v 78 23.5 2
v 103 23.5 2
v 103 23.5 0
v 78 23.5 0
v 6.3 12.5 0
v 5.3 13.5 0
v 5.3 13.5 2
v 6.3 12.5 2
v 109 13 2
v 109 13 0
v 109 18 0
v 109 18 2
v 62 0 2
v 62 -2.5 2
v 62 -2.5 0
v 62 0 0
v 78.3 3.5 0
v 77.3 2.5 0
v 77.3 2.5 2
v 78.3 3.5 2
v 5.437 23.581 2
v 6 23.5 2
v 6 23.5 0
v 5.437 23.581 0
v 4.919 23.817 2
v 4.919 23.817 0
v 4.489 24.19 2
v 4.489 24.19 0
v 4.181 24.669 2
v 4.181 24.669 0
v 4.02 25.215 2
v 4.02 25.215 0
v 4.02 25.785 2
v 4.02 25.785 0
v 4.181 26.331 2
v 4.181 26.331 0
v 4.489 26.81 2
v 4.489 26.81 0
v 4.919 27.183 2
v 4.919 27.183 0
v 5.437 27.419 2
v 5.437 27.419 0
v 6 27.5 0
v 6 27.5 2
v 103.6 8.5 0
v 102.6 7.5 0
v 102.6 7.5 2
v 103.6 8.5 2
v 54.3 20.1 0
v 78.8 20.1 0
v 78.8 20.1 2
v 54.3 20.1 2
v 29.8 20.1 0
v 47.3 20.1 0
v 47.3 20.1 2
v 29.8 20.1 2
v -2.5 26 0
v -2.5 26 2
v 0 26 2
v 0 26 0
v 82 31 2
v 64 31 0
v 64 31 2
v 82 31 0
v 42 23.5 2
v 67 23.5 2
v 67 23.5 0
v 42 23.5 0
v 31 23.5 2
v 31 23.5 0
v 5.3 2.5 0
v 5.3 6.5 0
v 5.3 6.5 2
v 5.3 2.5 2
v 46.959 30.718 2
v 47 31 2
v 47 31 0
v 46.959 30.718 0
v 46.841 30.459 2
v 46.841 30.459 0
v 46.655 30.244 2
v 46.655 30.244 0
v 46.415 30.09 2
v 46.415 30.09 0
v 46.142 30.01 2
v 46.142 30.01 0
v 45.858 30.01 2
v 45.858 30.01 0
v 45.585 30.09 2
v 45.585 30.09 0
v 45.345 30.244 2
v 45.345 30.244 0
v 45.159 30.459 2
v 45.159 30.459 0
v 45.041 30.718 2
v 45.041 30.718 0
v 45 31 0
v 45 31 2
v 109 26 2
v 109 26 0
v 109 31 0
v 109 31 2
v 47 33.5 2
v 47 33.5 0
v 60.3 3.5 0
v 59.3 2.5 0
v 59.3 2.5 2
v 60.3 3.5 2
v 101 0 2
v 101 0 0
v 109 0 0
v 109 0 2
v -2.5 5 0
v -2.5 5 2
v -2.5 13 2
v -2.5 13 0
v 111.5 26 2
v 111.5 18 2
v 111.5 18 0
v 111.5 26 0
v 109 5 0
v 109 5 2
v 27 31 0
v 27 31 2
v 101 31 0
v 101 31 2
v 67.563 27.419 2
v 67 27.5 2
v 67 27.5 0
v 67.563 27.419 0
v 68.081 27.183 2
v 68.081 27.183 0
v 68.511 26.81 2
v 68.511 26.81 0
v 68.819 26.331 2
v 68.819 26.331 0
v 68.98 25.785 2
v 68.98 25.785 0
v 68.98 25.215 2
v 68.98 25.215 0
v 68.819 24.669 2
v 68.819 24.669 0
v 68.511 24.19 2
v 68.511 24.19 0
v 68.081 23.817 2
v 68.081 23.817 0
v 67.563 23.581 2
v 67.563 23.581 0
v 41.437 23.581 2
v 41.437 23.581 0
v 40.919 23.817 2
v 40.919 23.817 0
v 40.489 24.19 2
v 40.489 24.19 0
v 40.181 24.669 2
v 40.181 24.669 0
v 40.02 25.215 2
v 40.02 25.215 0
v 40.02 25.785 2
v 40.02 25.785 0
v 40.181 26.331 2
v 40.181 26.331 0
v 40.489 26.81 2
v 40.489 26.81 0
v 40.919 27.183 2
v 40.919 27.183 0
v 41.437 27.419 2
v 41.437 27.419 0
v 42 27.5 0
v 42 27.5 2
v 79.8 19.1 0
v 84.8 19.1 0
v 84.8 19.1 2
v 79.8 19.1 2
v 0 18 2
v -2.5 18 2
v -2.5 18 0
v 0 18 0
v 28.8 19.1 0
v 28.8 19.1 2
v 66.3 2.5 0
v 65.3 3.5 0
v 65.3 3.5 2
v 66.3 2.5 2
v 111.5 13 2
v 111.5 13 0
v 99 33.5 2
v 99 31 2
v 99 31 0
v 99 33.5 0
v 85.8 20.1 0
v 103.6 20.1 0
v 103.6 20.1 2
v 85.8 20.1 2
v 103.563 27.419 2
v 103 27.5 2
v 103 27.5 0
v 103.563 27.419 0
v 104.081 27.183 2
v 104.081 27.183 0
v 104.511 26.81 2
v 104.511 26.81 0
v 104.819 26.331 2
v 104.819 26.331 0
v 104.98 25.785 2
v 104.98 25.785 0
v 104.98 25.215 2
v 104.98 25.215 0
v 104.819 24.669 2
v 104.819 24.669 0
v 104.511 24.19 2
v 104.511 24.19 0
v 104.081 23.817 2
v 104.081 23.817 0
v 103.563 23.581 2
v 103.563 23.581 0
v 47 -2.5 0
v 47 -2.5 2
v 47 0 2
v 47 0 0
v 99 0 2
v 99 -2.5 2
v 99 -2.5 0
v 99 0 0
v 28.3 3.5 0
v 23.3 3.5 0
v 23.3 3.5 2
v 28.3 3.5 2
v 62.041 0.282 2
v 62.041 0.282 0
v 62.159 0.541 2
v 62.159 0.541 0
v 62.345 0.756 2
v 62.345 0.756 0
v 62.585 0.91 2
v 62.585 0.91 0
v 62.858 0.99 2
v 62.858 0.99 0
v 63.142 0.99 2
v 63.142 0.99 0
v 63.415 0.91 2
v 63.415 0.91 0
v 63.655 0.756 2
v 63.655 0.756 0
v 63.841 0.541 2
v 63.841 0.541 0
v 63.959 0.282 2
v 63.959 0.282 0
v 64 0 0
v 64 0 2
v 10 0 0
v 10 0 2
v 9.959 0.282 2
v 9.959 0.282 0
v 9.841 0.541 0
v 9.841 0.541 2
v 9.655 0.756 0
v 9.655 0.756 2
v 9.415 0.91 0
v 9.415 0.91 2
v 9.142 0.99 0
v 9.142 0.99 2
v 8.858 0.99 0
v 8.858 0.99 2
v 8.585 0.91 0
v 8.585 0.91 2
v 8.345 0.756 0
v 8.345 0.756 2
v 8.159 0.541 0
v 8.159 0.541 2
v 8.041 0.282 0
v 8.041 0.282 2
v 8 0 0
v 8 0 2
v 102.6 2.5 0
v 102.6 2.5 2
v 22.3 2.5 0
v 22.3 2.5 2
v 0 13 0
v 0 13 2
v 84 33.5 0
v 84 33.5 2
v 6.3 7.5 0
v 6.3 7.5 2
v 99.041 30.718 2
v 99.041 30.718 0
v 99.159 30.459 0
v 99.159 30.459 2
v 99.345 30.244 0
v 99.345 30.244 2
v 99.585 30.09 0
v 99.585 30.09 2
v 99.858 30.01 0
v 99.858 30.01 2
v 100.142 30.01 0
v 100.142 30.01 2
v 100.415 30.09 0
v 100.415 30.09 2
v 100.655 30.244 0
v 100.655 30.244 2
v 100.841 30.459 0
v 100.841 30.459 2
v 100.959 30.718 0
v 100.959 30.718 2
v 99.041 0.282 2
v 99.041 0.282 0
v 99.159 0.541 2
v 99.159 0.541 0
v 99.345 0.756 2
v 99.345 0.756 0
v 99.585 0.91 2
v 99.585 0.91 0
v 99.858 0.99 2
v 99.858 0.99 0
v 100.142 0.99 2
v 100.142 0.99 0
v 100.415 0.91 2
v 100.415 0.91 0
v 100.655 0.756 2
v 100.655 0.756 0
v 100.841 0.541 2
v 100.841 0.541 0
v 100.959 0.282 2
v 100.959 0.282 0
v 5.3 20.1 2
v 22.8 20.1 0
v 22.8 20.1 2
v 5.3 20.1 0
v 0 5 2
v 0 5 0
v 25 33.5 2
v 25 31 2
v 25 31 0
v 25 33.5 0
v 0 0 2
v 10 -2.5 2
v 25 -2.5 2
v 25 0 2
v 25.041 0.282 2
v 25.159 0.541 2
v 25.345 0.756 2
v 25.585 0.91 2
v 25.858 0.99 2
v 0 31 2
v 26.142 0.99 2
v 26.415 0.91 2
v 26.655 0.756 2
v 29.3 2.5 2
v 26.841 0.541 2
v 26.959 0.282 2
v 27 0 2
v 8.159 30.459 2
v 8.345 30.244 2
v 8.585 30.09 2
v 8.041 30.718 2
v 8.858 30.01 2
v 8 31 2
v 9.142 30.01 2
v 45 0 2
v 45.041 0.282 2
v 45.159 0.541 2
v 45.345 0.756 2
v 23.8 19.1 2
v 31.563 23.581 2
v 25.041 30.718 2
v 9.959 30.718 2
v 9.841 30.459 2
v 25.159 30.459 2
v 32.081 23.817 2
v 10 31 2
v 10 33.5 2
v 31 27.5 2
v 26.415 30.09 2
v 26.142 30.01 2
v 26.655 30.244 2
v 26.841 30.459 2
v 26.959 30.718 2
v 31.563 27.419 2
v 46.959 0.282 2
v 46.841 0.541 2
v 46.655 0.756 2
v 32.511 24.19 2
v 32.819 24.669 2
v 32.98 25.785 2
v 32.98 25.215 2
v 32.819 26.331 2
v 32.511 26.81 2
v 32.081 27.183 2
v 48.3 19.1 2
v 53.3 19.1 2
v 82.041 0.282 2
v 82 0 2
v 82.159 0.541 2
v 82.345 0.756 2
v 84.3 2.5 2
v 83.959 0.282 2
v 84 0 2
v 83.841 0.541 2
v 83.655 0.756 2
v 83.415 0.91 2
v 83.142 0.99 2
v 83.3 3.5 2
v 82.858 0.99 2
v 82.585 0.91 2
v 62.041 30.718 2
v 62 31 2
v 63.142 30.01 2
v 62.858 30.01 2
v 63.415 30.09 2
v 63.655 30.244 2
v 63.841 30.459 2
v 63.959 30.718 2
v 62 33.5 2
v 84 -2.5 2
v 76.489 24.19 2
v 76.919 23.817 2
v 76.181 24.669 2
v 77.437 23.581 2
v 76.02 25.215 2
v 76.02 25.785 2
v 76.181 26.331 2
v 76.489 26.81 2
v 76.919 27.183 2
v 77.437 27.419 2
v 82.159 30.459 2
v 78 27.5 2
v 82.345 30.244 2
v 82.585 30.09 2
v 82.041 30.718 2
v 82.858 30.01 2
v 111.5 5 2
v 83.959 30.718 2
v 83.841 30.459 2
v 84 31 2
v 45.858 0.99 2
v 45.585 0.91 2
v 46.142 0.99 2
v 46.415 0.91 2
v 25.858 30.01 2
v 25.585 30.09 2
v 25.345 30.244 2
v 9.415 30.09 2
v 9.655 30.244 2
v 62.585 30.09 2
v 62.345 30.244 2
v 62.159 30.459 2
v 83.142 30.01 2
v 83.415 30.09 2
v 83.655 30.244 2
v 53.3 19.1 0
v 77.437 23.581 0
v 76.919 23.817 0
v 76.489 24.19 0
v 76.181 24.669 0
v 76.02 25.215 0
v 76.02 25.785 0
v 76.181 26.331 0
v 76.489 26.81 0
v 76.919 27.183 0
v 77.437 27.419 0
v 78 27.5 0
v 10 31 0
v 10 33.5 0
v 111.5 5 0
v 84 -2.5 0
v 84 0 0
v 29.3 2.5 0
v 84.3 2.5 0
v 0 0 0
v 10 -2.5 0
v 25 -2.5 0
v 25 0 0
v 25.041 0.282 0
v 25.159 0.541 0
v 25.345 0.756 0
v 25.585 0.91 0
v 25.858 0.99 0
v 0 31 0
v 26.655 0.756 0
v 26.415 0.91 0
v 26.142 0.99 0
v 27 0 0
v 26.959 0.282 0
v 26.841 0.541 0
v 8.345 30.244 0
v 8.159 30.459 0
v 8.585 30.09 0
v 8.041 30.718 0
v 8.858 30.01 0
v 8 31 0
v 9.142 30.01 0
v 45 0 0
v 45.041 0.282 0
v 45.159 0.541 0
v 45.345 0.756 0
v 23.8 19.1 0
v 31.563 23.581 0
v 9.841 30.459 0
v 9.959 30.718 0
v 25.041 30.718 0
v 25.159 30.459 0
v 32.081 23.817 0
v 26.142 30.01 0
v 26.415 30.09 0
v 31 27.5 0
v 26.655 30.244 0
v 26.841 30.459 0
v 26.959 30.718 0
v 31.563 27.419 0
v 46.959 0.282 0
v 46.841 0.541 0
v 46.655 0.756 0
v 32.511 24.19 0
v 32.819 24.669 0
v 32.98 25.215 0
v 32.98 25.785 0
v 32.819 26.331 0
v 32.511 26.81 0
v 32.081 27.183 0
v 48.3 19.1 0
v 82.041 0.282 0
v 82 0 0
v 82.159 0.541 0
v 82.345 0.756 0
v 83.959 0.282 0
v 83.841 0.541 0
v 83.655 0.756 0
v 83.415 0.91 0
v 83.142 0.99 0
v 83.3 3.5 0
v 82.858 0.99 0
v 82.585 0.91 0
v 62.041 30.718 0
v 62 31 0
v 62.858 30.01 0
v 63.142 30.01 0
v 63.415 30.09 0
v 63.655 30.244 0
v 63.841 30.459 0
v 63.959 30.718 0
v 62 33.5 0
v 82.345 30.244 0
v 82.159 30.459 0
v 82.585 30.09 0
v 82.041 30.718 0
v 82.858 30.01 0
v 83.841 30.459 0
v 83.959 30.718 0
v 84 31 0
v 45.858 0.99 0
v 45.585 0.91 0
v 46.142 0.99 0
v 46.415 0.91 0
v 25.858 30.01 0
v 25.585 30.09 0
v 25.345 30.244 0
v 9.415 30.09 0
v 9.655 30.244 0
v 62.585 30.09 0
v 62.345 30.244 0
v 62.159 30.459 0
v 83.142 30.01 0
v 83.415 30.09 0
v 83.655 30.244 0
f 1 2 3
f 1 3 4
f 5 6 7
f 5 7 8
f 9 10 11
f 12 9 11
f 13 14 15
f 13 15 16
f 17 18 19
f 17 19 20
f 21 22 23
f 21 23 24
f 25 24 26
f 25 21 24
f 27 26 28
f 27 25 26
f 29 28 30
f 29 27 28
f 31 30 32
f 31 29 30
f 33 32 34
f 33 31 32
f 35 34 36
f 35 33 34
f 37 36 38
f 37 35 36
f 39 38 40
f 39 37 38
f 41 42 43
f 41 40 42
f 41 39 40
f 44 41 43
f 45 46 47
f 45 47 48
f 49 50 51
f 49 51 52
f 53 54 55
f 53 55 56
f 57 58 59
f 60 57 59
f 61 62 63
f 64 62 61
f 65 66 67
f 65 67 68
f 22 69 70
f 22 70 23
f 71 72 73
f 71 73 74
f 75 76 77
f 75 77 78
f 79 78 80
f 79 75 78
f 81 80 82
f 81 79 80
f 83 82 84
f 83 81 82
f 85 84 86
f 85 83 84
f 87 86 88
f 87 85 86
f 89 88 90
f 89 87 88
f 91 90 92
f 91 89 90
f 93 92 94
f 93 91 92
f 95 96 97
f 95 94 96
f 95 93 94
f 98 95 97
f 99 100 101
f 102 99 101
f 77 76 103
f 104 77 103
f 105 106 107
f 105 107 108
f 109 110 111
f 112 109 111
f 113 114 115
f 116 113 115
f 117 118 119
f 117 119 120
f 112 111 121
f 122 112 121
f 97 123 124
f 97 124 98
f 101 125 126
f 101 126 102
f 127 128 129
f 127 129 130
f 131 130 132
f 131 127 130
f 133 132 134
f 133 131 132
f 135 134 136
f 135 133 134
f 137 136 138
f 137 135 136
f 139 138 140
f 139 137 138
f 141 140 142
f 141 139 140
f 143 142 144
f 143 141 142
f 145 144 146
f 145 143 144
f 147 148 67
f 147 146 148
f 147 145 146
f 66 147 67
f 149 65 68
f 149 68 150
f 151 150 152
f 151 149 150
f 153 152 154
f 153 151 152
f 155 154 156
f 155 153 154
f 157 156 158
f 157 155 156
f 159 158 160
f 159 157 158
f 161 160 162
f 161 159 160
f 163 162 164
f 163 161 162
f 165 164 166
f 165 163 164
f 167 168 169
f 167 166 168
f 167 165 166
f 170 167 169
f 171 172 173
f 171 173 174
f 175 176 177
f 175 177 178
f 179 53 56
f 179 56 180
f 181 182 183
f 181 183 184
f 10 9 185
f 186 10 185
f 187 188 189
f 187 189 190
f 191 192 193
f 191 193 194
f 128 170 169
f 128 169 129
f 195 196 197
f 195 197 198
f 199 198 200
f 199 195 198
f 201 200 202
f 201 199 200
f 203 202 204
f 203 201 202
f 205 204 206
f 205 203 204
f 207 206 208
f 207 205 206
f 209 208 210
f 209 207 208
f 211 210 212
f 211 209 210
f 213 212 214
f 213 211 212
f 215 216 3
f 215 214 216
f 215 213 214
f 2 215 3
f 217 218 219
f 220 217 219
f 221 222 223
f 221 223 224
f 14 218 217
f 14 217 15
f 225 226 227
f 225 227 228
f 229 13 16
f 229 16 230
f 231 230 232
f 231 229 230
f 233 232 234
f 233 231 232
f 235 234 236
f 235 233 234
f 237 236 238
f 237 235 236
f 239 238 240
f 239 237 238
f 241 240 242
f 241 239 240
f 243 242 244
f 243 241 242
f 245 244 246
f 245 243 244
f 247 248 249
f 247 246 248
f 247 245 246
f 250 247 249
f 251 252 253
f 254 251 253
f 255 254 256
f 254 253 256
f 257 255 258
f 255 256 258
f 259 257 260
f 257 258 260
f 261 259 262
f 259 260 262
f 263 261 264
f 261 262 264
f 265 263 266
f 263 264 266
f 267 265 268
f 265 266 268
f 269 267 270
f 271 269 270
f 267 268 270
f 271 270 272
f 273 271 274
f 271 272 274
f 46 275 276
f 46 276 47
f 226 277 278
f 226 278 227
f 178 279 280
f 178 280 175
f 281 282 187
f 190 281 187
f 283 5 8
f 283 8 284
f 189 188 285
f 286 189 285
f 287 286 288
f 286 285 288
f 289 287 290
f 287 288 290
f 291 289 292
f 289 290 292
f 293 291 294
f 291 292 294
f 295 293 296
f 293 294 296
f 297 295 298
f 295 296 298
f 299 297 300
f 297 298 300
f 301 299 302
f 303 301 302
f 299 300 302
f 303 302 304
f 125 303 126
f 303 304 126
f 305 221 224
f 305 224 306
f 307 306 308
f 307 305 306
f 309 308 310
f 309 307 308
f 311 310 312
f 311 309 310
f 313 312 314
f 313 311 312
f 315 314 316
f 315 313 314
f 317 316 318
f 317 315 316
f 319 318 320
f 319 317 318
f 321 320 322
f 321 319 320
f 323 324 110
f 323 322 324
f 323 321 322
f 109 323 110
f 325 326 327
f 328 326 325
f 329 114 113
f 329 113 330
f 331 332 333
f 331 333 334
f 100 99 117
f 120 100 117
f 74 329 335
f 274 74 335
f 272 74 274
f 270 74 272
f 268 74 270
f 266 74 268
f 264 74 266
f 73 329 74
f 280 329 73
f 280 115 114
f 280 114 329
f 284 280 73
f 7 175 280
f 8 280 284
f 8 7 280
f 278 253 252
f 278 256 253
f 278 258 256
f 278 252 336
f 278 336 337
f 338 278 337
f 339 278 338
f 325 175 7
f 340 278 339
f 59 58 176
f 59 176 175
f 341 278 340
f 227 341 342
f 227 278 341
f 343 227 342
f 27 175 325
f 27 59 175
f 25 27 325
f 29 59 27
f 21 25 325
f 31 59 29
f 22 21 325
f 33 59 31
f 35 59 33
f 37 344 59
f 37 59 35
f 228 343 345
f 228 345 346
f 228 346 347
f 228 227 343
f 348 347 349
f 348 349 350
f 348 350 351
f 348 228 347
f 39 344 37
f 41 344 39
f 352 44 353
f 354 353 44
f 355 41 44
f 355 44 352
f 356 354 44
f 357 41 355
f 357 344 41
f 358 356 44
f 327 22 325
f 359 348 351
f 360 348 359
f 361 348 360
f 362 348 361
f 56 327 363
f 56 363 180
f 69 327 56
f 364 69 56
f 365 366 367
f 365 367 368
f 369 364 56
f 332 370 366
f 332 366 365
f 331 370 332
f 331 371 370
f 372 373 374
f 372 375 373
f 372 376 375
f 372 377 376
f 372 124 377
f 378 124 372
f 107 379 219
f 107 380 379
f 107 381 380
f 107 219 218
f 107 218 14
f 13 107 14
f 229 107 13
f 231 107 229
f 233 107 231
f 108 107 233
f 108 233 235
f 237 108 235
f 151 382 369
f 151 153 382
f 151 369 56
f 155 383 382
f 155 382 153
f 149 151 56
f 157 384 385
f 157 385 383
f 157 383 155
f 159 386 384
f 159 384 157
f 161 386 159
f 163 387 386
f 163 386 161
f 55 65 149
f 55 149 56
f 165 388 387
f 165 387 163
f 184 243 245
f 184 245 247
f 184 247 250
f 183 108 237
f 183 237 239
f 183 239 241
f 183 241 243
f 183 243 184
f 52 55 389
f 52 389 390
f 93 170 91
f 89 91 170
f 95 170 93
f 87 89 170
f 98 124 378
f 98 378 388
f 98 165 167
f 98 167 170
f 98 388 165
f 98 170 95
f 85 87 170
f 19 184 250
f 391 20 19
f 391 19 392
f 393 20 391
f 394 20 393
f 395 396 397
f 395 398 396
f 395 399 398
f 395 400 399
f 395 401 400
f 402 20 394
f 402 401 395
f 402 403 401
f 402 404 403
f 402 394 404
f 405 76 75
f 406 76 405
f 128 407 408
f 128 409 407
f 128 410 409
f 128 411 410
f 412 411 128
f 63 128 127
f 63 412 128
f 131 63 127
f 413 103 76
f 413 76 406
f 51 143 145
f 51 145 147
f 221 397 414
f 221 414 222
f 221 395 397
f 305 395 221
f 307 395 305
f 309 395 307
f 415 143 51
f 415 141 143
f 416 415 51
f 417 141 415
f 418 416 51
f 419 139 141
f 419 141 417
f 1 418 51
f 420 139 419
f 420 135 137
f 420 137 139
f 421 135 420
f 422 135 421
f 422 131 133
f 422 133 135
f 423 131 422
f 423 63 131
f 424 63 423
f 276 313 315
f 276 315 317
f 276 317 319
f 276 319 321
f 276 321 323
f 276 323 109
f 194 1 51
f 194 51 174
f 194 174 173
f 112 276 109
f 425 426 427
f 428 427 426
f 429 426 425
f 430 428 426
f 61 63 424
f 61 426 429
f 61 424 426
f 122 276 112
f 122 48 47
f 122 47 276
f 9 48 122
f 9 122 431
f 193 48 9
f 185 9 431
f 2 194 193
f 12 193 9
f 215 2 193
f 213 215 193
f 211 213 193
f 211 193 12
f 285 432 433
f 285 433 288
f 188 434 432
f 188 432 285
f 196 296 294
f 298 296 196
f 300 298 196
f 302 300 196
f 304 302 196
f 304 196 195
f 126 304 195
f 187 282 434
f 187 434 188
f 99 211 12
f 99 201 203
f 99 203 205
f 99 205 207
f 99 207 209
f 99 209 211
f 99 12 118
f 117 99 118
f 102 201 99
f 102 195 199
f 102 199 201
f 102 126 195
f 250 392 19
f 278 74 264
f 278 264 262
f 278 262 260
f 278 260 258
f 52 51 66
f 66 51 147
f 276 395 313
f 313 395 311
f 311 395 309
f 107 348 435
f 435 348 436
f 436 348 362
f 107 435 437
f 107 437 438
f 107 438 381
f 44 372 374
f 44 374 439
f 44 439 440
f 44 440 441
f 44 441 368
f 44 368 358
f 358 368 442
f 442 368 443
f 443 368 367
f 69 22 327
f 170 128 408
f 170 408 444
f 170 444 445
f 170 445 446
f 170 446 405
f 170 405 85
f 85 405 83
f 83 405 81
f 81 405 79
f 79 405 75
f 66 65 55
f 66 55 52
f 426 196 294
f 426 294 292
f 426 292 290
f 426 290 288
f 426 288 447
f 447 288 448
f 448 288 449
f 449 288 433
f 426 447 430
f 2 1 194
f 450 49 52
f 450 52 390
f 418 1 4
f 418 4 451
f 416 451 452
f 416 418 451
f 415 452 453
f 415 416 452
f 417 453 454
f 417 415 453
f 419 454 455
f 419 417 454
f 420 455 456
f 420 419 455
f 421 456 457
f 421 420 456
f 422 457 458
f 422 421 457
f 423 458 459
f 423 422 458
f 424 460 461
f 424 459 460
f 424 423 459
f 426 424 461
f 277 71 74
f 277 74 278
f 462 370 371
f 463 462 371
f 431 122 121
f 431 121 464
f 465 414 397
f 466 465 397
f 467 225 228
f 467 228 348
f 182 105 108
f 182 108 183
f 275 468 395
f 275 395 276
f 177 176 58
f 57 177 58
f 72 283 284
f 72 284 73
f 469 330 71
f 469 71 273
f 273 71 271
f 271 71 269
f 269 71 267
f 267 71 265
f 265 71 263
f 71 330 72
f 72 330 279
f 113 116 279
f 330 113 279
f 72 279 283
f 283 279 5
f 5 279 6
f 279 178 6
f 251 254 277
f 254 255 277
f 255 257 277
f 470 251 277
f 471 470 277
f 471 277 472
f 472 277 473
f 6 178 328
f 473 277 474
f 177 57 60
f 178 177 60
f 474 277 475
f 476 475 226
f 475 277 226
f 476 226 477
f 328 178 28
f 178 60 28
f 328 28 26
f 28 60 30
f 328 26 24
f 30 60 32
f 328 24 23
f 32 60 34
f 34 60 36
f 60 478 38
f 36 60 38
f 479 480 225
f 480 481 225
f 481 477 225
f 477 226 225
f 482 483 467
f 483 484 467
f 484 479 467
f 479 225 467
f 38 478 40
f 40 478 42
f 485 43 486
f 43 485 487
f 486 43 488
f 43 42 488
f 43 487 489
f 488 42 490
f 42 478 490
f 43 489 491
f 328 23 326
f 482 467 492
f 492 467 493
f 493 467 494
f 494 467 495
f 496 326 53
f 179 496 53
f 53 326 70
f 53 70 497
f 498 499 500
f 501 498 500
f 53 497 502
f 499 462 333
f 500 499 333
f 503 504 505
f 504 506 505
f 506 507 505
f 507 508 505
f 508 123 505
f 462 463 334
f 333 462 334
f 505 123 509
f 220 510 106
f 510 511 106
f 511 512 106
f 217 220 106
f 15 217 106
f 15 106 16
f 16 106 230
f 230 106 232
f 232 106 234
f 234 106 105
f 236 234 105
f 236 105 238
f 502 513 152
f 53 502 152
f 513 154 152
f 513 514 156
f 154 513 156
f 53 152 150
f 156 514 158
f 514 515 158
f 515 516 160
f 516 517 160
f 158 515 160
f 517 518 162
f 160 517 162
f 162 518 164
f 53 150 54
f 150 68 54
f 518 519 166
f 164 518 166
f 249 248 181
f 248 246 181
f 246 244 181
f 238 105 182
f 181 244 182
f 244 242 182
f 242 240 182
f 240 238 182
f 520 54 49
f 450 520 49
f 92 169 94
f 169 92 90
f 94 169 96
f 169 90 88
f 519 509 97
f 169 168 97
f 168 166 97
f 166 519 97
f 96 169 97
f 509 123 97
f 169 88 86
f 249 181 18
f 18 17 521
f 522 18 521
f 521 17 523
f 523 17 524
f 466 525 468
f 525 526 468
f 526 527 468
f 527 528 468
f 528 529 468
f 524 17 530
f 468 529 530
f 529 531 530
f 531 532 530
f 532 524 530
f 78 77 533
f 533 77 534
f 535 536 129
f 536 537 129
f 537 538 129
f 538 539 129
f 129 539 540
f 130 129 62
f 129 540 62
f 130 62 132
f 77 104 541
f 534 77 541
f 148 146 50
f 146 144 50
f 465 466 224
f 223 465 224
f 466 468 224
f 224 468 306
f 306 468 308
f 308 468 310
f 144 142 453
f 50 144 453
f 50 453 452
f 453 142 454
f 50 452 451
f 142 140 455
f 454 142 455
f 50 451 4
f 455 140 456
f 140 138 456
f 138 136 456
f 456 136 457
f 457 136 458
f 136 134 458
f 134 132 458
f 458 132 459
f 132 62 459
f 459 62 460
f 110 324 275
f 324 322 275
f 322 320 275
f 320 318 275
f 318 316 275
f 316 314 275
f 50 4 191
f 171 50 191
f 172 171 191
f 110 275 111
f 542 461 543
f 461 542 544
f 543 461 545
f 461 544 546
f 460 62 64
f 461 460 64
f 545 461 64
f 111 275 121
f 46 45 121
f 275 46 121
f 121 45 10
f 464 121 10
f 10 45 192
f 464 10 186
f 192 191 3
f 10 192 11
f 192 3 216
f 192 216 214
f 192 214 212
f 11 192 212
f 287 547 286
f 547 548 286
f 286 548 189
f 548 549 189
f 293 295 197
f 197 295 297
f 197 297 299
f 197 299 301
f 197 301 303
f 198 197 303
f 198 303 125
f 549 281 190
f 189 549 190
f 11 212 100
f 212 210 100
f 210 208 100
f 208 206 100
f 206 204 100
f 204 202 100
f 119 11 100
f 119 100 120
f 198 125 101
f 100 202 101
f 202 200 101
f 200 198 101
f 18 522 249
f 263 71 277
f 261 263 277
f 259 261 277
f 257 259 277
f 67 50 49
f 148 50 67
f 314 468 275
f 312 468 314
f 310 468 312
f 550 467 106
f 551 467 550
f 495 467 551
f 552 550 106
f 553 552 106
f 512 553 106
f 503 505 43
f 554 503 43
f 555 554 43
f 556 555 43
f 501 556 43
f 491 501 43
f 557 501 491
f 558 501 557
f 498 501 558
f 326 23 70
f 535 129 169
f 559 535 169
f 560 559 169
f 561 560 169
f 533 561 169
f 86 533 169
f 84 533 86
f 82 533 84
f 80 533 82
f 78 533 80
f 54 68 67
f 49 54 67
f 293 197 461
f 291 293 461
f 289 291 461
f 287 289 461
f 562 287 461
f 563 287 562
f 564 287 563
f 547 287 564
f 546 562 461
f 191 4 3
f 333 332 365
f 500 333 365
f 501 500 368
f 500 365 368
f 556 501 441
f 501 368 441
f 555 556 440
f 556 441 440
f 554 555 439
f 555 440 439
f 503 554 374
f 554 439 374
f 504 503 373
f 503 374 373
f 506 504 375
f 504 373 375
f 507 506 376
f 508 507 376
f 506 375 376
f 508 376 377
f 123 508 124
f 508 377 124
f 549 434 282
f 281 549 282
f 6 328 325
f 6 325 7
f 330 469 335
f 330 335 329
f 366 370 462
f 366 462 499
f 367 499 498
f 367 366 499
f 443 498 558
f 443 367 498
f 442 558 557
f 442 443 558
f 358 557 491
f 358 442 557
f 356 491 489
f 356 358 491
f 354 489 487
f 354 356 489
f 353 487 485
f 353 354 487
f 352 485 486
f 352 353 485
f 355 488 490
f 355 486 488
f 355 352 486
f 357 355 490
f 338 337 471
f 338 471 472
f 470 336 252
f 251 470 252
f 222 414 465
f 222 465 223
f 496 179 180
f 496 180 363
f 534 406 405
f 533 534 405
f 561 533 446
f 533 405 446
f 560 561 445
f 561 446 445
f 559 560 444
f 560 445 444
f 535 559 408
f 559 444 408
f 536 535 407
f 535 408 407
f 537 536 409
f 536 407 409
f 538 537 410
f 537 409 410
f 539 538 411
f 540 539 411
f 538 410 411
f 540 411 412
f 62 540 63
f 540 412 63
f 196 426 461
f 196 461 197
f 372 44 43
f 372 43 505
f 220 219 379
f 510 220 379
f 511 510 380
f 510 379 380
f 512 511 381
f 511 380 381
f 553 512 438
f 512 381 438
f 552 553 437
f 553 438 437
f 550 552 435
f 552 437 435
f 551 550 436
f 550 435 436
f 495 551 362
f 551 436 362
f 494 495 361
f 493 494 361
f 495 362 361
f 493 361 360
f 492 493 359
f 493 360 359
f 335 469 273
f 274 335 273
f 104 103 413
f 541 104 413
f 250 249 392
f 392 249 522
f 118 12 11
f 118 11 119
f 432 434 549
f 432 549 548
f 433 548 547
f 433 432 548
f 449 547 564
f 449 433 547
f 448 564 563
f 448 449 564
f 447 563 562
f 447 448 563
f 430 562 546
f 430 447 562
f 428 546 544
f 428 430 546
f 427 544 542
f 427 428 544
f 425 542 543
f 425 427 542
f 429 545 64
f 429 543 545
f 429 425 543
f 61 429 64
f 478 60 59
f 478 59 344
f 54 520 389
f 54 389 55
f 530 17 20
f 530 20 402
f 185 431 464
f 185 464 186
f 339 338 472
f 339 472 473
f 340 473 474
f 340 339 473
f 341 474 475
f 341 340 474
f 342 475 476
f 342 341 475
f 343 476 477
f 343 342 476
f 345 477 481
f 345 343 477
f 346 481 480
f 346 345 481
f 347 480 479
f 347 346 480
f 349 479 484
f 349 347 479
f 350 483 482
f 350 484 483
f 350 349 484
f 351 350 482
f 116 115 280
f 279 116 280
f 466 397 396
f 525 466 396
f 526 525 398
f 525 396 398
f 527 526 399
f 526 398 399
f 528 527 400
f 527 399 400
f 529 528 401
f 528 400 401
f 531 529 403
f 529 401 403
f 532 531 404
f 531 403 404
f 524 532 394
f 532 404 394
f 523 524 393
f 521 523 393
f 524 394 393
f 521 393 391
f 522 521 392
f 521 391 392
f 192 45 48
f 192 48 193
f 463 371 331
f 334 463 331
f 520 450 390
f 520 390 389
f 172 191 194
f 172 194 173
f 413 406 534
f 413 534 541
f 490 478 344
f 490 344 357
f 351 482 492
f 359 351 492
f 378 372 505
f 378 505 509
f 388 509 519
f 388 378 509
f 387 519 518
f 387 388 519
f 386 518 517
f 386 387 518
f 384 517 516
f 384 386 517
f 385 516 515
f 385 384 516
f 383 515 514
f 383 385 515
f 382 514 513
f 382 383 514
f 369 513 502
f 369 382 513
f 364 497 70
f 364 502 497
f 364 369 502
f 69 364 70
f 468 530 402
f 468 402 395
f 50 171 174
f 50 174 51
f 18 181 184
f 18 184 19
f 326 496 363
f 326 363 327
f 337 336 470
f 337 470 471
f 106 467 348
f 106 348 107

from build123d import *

# Parameters (mm, degrees)
SKETCH_1_W          = 109
SKETCH_1_H          = 31
EXTRUDE_1_DEPTH     = 2
SKETCH_2_W          = 2.5
SKETCH_2_H          = 8
EXTRUDE_2_DEPTH     = 2
SKETCH_3_W          = 15
SKETCH_3_H          = 2.5
EXTRUDE_3_DEPTH     = 2
CUT_EXTRUDE_1_DEPTH = 117.44097217
CUT_EXTRUDE_2_DEPTH = 117.44097217


with BuildPart() as part:
    # 草图1 → 凸台-拉伸1 (new body)
    with BuildSketch(Plane.XY):
        with Locations((54.5, 15.5)):
            Rectangle(SKETCH_1_W, SKETCH_1_H)
        Polygon((23.3, 3.5), (28.3, 3.5), (29.3, 2.5), (59.3, 2.5), (60.3, 3.5), (65.3, 3.5), (66.3, 2.5), (77.3, 2.5), (78.3, 3.5), (83.3, 3.5), (84.3, 2.5), (102.6, 2.5), (102.6, 7.5), (103.6, 8.5), (103.6, 20.1), (85.8, 20.1), (84.8, 19.1), (79.8, 19.1), (78.8, 20.1), (54.3, 20.1), (53.3, 19.1), (48.3, 19.1), (47.3, 20.1), (29.8, 20.1), (28.8, 19.1), (23.8, 19.1), (22.8, 20.1), (5.3, 20.1), (5.3, 13.5), (6.3, 12.5), (6.3, 7.5), (5.3, 6.5), (5.3, 2.5), (22.3, 2.5), align=None, mode=Mode.SUBTRACT)
    extrude(amount=EXTRUDE_1_DEPTH)

    # 草图2 → 凸台-拉伸2 (add)
    with BuildSketch(Plane.XY.offset(2)):
        with Locations((-1.25, 22)):
            Rectangle(SKETCH_2_W, SKETCH_2_H)
        with Locations((-1.25, 9)):
            Rectangle(SKETCH_2_W, SKETCH_2_H)
        with Locations((110.25, 9)):
            Rectangle(SKETCH_2_W, SKETCH_2_H)
        with Locations((110.25, 22)):
            Rectangle(SKETCH_2_W, SKETCH_2_H)
    extrude(amount=-EXTRUDE_2_DEPTH)

    # 草图3 → 凸台-拉伸3 (add)
    with BuildSketch(Plane.XY.offset(2)):
        with Locations((17.5, 32.25)):
            Rectangle(SKETCH_3_W, SKETCH_3_H)
        with Locations((54.5, 32.25)):
            Rectangle(SKETCH_3_W, SKETCH_3_H)
        with Locations((91.5, 32.25)):
            Rectangle(SKETCH_3_W, SKETCH_3_H)
        with Locations((91.5, -1.25)):
            Rectangle(SKETCH_3_W, SKETCH_3_H)
        with Locations((54.5, -1.25)):
            Rectangle(SKETCH_3_W, SKETCH_3_H)
        with Locations((17.5, -1.25)):
            Rectangle(SKETCH_3_W, SKETCH_3_H)
    extrude(amount=-EXTRUDE_3_DEPTH)

    # 草图4 → 切除-拉伸1 (cut, through all)
    with BuildSketch(Plane.XY.offset(2)):
        with BuildLine():
            Line((8, 31), (10, 31))
            ThreePointArc((10, 31), (9, 30), (8, 31))
        make_face()
        with BuildLine():
            Line((27, 31), (25, 31))
            ThreePointArc((25, 31), (26, 30), (27, 31))
        make_face()
        with BuildLine():
            Line((45, 31), (47, 31))
            ThreePointArc((47, 31), (46, 30), (45, 31))
        make_face()
        with BuildLine():
            Line((64, 31), (62, 31))
            ThreePointArc((62, 31), (63, 30), (64, 31))
        make_face()
        with BuildLine():
            Line((82, 31), (84, 31))
            ThreePointArc((84, 31), (83, 30), (82, 31))
        make_face()
        with BuildLine():
            Line((101, 31), (99, 31))
            ThreePointArc((99, 31), (100, 30), (101, 31))
        make_face()
        with BuildLine():
            Line((101, 0), (99, 0))
            ThreePointArc((99, 0), (100, 1), (101, 0))
        make_face()
        with BuildLine():
            Line((82, 0), (84, 0))
            ThreePointArc((84, 0), (83, 1), (82, 0))
        make_face()
        with BuildLine():
            Line((64, 0), (62, 0))
            ThreePointArc((62, 0), (63, 1), (64, 0))
        make_face()
        with BuildLine():
            Line((45, 0), (47, 0))
            ThreePointArc((47, 0), (46, 1), (45, 0))
        make_face()
        with BuildLine():
            Line((27, 0), (25, 0))
            ThreePointArc((25, 0), (26, 1), (27, 0))
        make_face()
        with BuildLine():
            Line((8, 0), (10, 0))
            ThreePointArc((10, 0), (9, 1), (8, 0))
        make_face()
    extrude(amount=-CUT_EXTRUDE_1_DEPTH, mode=Mode.SUBTRACT)

    # 草图5 → 切除-拉伸2 (cut, through all)
    with BuildSketch(Plane.XY.offset(2)):
        with BuildLine():
            Line((6, 27.5), (31, 27.5))
            ThreePointArc((31, 27.5), (33, 25.5), (31, 23.5))
            Line((31, 23.5), (6, 23.5))
            ThreePointArc((6, 23.5), (4, 25.5), (6, 27.5))
        make_face()
        with BuildLine():
            Line((42, 27.5), (67, 27.5))
            ThreePointArc((67, 27.5), (69, 25.5), (67, 23.5))
            Line((67, 23.5), (42, 23.5))
            ThreePointArc((42, 23.5), (40, 25.5), (42, 27.5))
        make_face()
        with BuildLine():
            Line((78, 27.5), (103, 27.5))
            ThreePointArc((103, 27.5), (105, 25.5), (103, 23.5))
            Line((103, 23.5), (78, 23.5))
            ThreePointArc((78, 23.5), (76, 25.5), (78, 27.5))
        make_face()
    extrude(amount=-CUT_EXTRUDE_2_DEPTH, mode=Mode.SUBTRACT)


solid = part.part
